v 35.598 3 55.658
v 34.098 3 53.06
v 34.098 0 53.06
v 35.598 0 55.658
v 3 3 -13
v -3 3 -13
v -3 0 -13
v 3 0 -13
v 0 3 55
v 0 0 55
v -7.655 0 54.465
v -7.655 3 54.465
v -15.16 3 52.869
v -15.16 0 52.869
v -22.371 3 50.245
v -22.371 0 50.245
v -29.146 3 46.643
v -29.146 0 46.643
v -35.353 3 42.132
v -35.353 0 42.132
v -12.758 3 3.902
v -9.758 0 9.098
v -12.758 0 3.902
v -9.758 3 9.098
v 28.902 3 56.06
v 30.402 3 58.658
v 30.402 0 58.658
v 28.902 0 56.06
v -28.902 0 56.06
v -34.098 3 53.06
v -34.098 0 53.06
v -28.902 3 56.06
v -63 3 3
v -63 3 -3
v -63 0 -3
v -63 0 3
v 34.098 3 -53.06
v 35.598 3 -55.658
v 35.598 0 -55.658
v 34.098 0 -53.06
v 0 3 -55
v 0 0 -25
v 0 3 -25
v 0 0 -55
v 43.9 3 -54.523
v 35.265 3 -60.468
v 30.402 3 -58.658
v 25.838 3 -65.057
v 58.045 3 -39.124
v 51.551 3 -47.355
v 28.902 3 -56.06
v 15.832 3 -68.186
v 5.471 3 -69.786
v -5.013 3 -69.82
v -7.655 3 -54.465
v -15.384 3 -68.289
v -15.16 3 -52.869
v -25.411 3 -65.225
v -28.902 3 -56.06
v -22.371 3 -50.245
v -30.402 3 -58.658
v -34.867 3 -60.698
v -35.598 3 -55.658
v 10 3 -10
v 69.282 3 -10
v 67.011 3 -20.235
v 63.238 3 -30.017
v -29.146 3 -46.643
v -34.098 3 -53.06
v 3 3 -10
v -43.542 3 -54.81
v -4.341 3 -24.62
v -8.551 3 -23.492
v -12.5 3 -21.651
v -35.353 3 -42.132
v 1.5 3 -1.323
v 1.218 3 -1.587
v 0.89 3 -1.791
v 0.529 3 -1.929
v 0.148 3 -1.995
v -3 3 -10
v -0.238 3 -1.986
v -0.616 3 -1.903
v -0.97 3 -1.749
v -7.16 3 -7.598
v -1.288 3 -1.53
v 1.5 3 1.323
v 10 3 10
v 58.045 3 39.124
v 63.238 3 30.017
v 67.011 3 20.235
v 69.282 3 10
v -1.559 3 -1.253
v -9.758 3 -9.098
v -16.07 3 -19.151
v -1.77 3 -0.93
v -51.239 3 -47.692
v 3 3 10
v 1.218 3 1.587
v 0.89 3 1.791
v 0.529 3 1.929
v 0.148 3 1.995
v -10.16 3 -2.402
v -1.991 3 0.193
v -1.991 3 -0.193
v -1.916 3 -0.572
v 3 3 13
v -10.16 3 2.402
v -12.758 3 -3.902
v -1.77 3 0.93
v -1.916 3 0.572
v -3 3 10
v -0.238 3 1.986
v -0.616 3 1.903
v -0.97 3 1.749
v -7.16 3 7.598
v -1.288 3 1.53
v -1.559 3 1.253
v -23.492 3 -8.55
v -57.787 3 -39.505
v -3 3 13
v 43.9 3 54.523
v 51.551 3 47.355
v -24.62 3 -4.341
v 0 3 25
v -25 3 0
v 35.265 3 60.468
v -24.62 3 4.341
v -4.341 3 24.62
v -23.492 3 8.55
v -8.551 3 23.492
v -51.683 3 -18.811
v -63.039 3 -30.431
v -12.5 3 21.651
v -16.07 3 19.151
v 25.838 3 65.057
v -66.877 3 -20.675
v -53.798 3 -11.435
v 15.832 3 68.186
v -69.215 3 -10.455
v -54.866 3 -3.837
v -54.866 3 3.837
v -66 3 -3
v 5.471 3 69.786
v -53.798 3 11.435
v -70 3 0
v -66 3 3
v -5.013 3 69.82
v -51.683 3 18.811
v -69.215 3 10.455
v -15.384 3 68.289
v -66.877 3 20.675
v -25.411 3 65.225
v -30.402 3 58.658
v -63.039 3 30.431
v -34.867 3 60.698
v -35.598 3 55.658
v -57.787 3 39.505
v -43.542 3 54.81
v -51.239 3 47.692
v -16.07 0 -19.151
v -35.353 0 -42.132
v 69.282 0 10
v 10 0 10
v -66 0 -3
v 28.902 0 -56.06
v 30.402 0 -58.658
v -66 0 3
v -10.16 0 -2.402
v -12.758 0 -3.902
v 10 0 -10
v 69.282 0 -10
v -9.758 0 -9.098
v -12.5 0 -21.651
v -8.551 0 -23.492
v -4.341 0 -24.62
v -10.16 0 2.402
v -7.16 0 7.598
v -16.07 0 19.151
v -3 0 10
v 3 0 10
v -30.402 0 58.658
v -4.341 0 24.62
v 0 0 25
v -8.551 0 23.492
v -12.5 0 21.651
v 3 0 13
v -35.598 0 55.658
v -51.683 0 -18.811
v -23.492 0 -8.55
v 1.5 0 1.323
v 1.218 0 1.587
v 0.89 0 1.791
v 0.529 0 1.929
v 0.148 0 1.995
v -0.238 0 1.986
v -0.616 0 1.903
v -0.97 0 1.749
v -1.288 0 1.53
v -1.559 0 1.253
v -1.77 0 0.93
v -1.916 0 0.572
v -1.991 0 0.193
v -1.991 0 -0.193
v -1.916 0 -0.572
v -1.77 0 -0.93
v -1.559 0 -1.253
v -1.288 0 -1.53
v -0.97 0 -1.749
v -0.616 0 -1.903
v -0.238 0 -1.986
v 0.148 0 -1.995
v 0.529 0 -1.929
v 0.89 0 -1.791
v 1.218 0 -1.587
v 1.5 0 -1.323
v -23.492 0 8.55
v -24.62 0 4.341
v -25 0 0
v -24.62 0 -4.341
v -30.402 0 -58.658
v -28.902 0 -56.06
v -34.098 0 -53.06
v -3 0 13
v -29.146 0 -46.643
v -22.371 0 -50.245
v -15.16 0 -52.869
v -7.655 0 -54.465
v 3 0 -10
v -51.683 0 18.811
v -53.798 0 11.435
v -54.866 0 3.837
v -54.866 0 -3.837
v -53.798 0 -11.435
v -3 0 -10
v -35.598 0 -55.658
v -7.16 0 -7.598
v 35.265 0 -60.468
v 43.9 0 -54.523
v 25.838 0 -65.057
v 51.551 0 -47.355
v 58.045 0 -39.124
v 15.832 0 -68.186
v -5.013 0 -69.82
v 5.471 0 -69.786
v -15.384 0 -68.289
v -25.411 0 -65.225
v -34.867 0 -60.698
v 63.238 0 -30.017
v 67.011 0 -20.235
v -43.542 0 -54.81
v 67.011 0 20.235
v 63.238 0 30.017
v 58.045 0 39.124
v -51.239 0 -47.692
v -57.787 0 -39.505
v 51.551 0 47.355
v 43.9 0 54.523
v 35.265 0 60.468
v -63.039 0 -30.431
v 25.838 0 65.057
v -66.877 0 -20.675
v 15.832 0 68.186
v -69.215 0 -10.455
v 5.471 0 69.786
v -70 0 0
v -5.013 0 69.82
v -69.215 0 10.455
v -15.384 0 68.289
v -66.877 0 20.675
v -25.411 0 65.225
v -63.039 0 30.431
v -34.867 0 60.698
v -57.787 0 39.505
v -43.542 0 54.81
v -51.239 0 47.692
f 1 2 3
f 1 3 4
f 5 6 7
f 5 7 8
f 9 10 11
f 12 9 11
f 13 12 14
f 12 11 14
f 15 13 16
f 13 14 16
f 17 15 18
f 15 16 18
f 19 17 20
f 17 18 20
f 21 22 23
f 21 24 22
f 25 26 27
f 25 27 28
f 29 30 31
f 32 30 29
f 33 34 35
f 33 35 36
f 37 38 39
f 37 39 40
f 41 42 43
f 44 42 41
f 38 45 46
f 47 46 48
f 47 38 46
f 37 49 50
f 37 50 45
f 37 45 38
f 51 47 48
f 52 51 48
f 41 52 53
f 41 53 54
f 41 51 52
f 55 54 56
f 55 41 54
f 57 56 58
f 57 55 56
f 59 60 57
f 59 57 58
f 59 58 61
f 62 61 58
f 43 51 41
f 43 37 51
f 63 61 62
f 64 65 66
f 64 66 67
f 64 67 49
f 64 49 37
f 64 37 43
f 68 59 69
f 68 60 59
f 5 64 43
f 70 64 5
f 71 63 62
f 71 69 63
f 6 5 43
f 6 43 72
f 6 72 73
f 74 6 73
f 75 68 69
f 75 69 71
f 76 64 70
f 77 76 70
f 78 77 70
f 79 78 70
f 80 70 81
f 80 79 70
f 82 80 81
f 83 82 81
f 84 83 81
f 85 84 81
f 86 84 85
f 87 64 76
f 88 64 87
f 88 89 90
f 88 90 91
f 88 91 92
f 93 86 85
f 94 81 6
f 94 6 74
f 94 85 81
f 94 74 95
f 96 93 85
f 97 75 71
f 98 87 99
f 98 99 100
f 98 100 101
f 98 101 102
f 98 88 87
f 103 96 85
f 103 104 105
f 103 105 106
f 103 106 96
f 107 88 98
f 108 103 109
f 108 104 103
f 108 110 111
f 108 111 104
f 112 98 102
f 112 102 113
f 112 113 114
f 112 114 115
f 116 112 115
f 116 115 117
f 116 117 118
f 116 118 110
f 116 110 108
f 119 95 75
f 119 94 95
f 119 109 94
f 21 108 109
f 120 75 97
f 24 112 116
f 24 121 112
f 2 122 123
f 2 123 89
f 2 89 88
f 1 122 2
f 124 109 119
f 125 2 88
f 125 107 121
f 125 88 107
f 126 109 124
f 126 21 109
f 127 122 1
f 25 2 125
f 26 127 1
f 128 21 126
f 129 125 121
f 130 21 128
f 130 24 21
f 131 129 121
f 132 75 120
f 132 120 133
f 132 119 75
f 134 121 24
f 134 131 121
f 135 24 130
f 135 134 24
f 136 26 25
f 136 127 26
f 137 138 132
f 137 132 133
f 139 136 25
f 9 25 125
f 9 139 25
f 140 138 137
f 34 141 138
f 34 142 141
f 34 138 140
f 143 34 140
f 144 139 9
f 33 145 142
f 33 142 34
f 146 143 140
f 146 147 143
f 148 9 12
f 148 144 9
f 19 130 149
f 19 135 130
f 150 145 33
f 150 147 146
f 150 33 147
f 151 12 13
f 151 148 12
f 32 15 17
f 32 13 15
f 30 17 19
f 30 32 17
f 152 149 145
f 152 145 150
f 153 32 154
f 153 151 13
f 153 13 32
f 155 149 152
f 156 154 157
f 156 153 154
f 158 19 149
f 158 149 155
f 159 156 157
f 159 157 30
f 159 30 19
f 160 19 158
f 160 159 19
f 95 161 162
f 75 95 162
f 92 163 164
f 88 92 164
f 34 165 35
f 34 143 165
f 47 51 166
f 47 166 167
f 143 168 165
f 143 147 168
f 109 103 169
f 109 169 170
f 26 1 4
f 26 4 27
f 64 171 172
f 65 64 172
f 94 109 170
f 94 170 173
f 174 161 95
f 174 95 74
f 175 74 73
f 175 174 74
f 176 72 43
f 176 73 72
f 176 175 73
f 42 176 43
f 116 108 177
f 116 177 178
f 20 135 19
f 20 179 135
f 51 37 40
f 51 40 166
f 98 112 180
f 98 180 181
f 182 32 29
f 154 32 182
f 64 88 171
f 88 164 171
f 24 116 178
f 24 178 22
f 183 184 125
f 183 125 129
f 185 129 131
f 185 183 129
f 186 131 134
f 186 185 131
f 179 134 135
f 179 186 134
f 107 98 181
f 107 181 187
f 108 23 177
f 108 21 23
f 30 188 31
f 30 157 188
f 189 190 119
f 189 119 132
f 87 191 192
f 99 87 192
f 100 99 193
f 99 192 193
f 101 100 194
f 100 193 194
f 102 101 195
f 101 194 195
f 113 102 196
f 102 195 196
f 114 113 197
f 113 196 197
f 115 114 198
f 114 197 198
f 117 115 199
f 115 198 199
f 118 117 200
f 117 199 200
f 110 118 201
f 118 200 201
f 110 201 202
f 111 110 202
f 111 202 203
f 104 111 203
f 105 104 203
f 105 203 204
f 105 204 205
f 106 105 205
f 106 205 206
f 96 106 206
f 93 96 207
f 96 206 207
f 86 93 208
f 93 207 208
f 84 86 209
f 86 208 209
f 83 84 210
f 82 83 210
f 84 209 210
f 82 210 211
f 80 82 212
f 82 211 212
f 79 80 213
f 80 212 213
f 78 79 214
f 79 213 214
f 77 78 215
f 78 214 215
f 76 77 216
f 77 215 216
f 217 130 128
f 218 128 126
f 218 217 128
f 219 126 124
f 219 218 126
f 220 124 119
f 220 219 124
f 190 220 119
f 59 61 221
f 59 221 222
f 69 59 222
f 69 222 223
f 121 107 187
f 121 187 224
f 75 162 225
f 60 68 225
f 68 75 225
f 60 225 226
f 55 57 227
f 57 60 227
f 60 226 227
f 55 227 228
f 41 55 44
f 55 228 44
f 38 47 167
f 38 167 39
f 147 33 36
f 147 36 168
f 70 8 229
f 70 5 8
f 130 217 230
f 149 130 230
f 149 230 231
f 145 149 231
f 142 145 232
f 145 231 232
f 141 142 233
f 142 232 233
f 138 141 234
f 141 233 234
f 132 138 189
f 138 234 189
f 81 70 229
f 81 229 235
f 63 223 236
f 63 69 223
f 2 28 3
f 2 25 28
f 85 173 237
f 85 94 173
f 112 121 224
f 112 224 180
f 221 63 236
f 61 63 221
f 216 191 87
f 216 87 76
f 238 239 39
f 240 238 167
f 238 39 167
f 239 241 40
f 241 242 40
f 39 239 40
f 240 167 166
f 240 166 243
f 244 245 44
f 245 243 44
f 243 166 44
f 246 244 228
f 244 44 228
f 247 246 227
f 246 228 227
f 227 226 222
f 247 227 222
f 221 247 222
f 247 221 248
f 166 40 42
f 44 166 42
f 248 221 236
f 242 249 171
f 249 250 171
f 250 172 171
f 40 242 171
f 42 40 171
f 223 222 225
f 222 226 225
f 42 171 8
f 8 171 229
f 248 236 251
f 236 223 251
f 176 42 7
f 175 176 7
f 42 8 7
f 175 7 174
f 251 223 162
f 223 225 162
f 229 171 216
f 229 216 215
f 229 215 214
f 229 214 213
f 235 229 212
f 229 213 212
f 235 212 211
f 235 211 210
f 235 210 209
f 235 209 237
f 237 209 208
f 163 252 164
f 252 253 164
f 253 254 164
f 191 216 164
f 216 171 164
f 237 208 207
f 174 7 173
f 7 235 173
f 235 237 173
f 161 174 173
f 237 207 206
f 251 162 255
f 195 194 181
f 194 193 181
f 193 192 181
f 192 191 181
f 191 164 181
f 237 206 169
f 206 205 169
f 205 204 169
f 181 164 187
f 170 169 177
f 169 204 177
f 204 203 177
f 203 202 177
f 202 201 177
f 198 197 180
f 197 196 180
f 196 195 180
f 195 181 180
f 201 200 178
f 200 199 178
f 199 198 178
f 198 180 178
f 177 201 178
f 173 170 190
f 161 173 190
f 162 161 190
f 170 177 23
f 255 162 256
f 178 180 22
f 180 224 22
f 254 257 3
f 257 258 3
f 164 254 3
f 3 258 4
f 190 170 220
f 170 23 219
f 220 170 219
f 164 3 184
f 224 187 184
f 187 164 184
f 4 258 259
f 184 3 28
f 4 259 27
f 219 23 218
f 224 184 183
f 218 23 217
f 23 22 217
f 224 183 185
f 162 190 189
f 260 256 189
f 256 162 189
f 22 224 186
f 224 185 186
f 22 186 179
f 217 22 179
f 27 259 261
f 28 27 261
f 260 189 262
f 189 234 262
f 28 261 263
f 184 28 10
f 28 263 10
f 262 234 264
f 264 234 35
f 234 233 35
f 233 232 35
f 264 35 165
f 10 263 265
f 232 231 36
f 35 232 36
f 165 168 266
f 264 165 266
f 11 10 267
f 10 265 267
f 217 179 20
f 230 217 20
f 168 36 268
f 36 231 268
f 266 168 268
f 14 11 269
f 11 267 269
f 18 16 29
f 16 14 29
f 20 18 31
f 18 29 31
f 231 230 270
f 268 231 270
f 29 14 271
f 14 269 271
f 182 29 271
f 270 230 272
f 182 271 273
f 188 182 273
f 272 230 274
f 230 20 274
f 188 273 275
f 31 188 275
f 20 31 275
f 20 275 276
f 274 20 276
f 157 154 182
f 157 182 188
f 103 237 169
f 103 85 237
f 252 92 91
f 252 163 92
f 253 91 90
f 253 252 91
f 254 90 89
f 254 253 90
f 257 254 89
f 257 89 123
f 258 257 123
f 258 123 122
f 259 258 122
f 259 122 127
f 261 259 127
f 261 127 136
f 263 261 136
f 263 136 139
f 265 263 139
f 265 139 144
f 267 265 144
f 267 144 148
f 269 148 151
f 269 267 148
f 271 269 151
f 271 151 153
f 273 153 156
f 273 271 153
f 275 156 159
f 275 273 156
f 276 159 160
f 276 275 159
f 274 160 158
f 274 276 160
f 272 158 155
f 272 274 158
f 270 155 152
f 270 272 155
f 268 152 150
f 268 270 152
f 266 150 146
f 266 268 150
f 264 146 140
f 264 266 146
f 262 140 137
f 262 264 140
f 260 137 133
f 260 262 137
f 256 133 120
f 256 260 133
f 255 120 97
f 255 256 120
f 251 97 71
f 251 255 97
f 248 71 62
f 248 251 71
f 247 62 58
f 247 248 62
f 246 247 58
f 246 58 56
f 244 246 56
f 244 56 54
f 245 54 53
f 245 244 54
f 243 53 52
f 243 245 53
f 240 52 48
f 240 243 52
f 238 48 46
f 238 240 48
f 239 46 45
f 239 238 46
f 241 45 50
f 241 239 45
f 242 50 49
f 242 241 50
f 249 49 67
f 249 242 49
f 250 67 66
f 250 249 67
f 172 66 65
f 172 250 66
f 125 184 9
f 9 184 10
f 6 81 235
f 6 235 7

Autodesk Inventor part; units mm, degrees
ref_plane "YZ Plane" through (0, 0, 0) normal (1, 0, 0) x (0, 1, 0)
ref_plane "XZ Plane" through (0, 0, 0) normal (0, 1, 0) x (-1, 0, 0)
ref_plane "XY Plane" through (0, 0, 0) normal (0, 0, 1) x (1, 0, 0)
sketch "草圖1" plane through (0, 0, 0) normal (0, 1, 0) x (-1, 0, 0)
  circle A0 centre (0, 0) radius 70
  circle A1 centre (0, 0) radius 25
  line L0 (-70, 10) -> (-10, 10)
  line L1 (-10, 10) -> (-10, -10)
  line L2 (-10, -10) -> (-70, -10)
  line L3 (-70, -10) -> (-70, 10)
  line L4 (0, 0) -> (0, -55)
  line L5 (0, 0) -> (35.3533, -42.1324)
  arc A2 (0, -55) -> (35.3533, -42.1324) centre (0, 0) ccw
  line L6 (0, 0) -> (51.6831, -18.8111)
  line L7 (0, 0) -> (51.6831, 18.8111)
  arc A3 (51.6831, -18.8111) -> (51.6831, 18.8111) centre (0, 0) ccw
  line L8 (0, 0) -> (35.3533, 42.1324)
  line L9 (0, 0) -> (0, 55)
  arc A4 (35.3533, 42.1324) -> (0, 55) centre (0, 0) ccw
  line L10 (-9.3, -13.3795) -> (-36.7, -13.3795)
  line L11 (-36.7, -13.3795) -> (-36.7, -69.3795)
  line L12 (-36.7, -69.3795) -> (-9.3, -69.3795)
  line L13 (-9.3, -69.3795) -> (-9.3, -13.3795)
  line L14 (-7.8, -20.3795) -> (-10.8, -20.3795)
  line L15 (-10.8, -20.3795) -> (-10.8, -27.3795)
  line L16 (-10.8, -27.3795) -> (-7.8, -27.3795)
  line L17 (-7.8, -27.3795) -> (-7.8, -20.3795)
  line L18 (-7.8, -55.3795) -> (-10.8, -55.3795)
  line L19 (-10.8, -55.3795) -> (-10.8, -62.3795)
  line L20 (-10.8, -62.3795) -> (-7.8, -62.3795)
  line L21 (-7.8, -62.3795) -> (-7.8, -55.3795)
  line L22 (-35.2, -20.3795) -> (-38.2, -20.3795)
  line L23 (-38.2, -20.3795) -> (-38.2, -27.3795)
  line L24 (-38.2, -27.3795) -> (-35.2, -27.3795)
  line L25 (-35.2, -27.3795) -> (-35.2, -20.3795)
  line L26 (-35.2, -48.3795) -> (-38.2, -48.3795)
  line L27 (-38.2, -48.3795) -> (-38.2, -55.3795)
  line L28 (-38.2, -55.3795) -> (-35.2, -55.3795)
  line L29 (-35.2, -55.3795) -> (-35.2, -48.3795)
  circle A5 centre (0, 0) radius 2
  line L30 (-1.5, 1.3229) -> (-1.5, -1.3229)
  point P0 (-23, -13.3795)
  point P1 (-9.3, -20.3795)
  point P2 (-9.3, -62.3795)
  point P3 (-36.7, -20.3795)
  point P4 (-36.7, -48.3795)
  point P5 (16.0697, -19.1511)
  point P6 (0, -25)
  point P7 (-69.282, 10)
  point P8 (-69.282, -10)
  point P9 (16.0697, 19.1511)
  point P10 (0, 25)
  point P11 (23.4923, -8.5505)
  point P12 (23.4923, 8.5505)
  point P13 (-70, 0)
  dimension "d0" = 140
  dimension "d1" = 50
  dimension "d2" = 20
  dimension "d3" = 60
  dimension "d4" = 55
  dimension "d5" = 40
  dimension "d6" = 55
  dimension "d9" = 140
  dimension "d11" = 13
  dimension "d12" = 27.4
  dimension "d13" = 56
  dimension "d14" = 7
  dimension "d15" = 3
  dimension "d16" = 7
  dimension "d17" = 7
  dimension "d18" = 3
  dimension "d19" = 7
  dimension "d20" = 7
  dimension "d21" = 3
  dimension "d22" = 7
  dimension "d23" = 7
  dimension "d24" = 3
  dimension "d25" = 21
  dimension "d28" = 4
  dimension "d29" = 1.5
extrude "擠出1" add sketch "草圖1" along normal blind 3 contours L13 L20 L21 L18 L16 L17 A1 L4 A2 L5 L6 A3 L7 L8 A4 L9 L0 A0 | A0 L11 L28 L29 L26 L24 L25 L22 L10 A1 L15 L16 L13 L18 L19 L20 | A0 L2 A1 L10 L11 L22 L23 L24 L26 L27 L28 | L20 L19 L18 L13 | L13 L18 L21 L20 | L28 L27 L26 L11 | L11 L26 L29 L28 | A1 L9 A5 L4 L17 L14 L13 L10 L2 L1 L0 | L16 L15 A1 L13 | L13 A1 L17 L16 | A1 L8 A5 L9 | L10 L13 L14 L15 A1 | L24 L23 L22 L11 | L11 L22 L25 L24 | L13 L14 L17 A1 | A1 L15 L14 L13 | A1 L7 A5 L8 | A1 L6 A5 L7 | L30 A5 | L4 A5 L5 A1 | A5 L6 A1 L5
sketch "草圖2" plane through (0, 3, 0) normal (0, 1, 0) x (1, 0, 0)
  line L0 (-66, 3) -> (-63, 3)
  line L1 (-63, 3) -> (-63, -3)
  line L2 (-63, -3) -> (-66, -3)
  line L3 (-66, -3) -> (-66, 3)
  line L4 (-35.5981, -55.6577) -> (-34.0981, -53.0596)
  line L5 (-34.0981, -53.0596) -> (-28.9019, -56.0596)
  line L6 (-28.9019, -56.0596) -> (-30.4019, -58.6577)
  line L7 (-30.4019, -58.6577) -> (-35.5981, -55.6577)
  line L8 (30.4019, -58.6577) -> (28.9019, -56.0596)
  line L9 (28.9019, -56.0596) -> (34.0981, -53.0596)
  line L10 (34.0981, -53.0596) -> (35.5981, -55.6577)
  line L11 (35.5981, -55.6577) -> (30.4019, -58.6577)
  line L12 (66, -3) -> (63, -3)
  line L13 (63, -3) -> (63, 3)
  line L14 (63, 3) -> (66, 3)
  line L15 (66, 3) -> (66, -3)
  line L16 (35.5981, 55.6577) -> (34.0981, 53.0596)
  line L17 (34.0981, 53.0596) -> (28.9019, 56.0596)
  line L18 (28.9019, 56.0596) -> (30.4019, 58.6577)
  line L19 (30.4019, 58.6577) -> (35.5981, 55.6577)
  line L20 (-30.4019, 58.6577) -> (-28.9019, 56.0596)
  line L21 (-28.9019, 56.0596) -> (-34.0981, 53.0596)
  line L22 (-34.0981, 53.0596) -> (-35.5981, 55.6577)
  line L23 (-35.5981, 55.6577) -> (-30.4019, 58.6577)
  point P0 (0, 0)
  point P1 (-63, 0)
  point P2 (-31.5, -54.5596)
  point P3 (31.5, -54.5596)
  point P4 (63, 0)
  point P5 (31.5, 54.5596)
  point P6 (-31.5, 54.5596)
  dimension "d30" = 3
  dimension "d31" = 6
  dimension "d32" = 63
  dimension "d37" = 360
extrude "擠出2" cut sketch "草圖2" against normal through all contours L0 L1 L2 L3 | L4 L5 L6 L7 | L8 L9 L10 L11 | L16 L17 L18 L19 | L20 L21 L22 L23
sketch "草圖3" plane through (0, 3, 0) normal (0, 1, 0) x (1, 0, 0)
  line L0 (-3, 13) -> (3, 13)
  line L1 (3, 13) -> (3, 10)
  line L2 (3, 10) -> (-3, 10)
  line L3 (-3, 10) -> (-3, 13)
  line L4 (-12.7583, 3.9019) -> (-9.7583, 9.0981)
  line L5 (-9.7583, 9.0981) -> (-7.1603, 7.5981)
  line L6 (-7.1603, 7.5981) -> (-10.1603, 2.4019)
  line L7 (-10.1603, 2.4019) -> (-12.7583, 3.9019)
  line L8 (-9.7583, -9.0981) -> (-12.7583, -3.9019)
  line L9 (-12.7583, -3.9019) -> (-10.1603, -2.4019)
  line L10 (-10.1603, -2.4019) -> (-7.1603, -7.5981)
  line L11 (-7.1603, -7.5981) -> (-9.7583, -9.0981)
  line L12 (3, -13) -> (-3, -13)
  line L13 (-3, -13) -> (-3, -10)
  line L14 (-3, -10) -> (3, -10)
  line L15 (3, -10) -> (3, -13)
  point P0 (0, 0)
  point P1 (0, 10)
  point P2 (-8.6603, 5)
  point P3 (-8.6603, -5)
  point P4 (0, -10)
  dimension "d39" = 6
  dimension "d40" = 3
  dimension "d41" = 10
  dimension "d44" = 180
extrude "擠出3" cut sketch "草圖3" against normal through all
properties part number "rolling_plate"
